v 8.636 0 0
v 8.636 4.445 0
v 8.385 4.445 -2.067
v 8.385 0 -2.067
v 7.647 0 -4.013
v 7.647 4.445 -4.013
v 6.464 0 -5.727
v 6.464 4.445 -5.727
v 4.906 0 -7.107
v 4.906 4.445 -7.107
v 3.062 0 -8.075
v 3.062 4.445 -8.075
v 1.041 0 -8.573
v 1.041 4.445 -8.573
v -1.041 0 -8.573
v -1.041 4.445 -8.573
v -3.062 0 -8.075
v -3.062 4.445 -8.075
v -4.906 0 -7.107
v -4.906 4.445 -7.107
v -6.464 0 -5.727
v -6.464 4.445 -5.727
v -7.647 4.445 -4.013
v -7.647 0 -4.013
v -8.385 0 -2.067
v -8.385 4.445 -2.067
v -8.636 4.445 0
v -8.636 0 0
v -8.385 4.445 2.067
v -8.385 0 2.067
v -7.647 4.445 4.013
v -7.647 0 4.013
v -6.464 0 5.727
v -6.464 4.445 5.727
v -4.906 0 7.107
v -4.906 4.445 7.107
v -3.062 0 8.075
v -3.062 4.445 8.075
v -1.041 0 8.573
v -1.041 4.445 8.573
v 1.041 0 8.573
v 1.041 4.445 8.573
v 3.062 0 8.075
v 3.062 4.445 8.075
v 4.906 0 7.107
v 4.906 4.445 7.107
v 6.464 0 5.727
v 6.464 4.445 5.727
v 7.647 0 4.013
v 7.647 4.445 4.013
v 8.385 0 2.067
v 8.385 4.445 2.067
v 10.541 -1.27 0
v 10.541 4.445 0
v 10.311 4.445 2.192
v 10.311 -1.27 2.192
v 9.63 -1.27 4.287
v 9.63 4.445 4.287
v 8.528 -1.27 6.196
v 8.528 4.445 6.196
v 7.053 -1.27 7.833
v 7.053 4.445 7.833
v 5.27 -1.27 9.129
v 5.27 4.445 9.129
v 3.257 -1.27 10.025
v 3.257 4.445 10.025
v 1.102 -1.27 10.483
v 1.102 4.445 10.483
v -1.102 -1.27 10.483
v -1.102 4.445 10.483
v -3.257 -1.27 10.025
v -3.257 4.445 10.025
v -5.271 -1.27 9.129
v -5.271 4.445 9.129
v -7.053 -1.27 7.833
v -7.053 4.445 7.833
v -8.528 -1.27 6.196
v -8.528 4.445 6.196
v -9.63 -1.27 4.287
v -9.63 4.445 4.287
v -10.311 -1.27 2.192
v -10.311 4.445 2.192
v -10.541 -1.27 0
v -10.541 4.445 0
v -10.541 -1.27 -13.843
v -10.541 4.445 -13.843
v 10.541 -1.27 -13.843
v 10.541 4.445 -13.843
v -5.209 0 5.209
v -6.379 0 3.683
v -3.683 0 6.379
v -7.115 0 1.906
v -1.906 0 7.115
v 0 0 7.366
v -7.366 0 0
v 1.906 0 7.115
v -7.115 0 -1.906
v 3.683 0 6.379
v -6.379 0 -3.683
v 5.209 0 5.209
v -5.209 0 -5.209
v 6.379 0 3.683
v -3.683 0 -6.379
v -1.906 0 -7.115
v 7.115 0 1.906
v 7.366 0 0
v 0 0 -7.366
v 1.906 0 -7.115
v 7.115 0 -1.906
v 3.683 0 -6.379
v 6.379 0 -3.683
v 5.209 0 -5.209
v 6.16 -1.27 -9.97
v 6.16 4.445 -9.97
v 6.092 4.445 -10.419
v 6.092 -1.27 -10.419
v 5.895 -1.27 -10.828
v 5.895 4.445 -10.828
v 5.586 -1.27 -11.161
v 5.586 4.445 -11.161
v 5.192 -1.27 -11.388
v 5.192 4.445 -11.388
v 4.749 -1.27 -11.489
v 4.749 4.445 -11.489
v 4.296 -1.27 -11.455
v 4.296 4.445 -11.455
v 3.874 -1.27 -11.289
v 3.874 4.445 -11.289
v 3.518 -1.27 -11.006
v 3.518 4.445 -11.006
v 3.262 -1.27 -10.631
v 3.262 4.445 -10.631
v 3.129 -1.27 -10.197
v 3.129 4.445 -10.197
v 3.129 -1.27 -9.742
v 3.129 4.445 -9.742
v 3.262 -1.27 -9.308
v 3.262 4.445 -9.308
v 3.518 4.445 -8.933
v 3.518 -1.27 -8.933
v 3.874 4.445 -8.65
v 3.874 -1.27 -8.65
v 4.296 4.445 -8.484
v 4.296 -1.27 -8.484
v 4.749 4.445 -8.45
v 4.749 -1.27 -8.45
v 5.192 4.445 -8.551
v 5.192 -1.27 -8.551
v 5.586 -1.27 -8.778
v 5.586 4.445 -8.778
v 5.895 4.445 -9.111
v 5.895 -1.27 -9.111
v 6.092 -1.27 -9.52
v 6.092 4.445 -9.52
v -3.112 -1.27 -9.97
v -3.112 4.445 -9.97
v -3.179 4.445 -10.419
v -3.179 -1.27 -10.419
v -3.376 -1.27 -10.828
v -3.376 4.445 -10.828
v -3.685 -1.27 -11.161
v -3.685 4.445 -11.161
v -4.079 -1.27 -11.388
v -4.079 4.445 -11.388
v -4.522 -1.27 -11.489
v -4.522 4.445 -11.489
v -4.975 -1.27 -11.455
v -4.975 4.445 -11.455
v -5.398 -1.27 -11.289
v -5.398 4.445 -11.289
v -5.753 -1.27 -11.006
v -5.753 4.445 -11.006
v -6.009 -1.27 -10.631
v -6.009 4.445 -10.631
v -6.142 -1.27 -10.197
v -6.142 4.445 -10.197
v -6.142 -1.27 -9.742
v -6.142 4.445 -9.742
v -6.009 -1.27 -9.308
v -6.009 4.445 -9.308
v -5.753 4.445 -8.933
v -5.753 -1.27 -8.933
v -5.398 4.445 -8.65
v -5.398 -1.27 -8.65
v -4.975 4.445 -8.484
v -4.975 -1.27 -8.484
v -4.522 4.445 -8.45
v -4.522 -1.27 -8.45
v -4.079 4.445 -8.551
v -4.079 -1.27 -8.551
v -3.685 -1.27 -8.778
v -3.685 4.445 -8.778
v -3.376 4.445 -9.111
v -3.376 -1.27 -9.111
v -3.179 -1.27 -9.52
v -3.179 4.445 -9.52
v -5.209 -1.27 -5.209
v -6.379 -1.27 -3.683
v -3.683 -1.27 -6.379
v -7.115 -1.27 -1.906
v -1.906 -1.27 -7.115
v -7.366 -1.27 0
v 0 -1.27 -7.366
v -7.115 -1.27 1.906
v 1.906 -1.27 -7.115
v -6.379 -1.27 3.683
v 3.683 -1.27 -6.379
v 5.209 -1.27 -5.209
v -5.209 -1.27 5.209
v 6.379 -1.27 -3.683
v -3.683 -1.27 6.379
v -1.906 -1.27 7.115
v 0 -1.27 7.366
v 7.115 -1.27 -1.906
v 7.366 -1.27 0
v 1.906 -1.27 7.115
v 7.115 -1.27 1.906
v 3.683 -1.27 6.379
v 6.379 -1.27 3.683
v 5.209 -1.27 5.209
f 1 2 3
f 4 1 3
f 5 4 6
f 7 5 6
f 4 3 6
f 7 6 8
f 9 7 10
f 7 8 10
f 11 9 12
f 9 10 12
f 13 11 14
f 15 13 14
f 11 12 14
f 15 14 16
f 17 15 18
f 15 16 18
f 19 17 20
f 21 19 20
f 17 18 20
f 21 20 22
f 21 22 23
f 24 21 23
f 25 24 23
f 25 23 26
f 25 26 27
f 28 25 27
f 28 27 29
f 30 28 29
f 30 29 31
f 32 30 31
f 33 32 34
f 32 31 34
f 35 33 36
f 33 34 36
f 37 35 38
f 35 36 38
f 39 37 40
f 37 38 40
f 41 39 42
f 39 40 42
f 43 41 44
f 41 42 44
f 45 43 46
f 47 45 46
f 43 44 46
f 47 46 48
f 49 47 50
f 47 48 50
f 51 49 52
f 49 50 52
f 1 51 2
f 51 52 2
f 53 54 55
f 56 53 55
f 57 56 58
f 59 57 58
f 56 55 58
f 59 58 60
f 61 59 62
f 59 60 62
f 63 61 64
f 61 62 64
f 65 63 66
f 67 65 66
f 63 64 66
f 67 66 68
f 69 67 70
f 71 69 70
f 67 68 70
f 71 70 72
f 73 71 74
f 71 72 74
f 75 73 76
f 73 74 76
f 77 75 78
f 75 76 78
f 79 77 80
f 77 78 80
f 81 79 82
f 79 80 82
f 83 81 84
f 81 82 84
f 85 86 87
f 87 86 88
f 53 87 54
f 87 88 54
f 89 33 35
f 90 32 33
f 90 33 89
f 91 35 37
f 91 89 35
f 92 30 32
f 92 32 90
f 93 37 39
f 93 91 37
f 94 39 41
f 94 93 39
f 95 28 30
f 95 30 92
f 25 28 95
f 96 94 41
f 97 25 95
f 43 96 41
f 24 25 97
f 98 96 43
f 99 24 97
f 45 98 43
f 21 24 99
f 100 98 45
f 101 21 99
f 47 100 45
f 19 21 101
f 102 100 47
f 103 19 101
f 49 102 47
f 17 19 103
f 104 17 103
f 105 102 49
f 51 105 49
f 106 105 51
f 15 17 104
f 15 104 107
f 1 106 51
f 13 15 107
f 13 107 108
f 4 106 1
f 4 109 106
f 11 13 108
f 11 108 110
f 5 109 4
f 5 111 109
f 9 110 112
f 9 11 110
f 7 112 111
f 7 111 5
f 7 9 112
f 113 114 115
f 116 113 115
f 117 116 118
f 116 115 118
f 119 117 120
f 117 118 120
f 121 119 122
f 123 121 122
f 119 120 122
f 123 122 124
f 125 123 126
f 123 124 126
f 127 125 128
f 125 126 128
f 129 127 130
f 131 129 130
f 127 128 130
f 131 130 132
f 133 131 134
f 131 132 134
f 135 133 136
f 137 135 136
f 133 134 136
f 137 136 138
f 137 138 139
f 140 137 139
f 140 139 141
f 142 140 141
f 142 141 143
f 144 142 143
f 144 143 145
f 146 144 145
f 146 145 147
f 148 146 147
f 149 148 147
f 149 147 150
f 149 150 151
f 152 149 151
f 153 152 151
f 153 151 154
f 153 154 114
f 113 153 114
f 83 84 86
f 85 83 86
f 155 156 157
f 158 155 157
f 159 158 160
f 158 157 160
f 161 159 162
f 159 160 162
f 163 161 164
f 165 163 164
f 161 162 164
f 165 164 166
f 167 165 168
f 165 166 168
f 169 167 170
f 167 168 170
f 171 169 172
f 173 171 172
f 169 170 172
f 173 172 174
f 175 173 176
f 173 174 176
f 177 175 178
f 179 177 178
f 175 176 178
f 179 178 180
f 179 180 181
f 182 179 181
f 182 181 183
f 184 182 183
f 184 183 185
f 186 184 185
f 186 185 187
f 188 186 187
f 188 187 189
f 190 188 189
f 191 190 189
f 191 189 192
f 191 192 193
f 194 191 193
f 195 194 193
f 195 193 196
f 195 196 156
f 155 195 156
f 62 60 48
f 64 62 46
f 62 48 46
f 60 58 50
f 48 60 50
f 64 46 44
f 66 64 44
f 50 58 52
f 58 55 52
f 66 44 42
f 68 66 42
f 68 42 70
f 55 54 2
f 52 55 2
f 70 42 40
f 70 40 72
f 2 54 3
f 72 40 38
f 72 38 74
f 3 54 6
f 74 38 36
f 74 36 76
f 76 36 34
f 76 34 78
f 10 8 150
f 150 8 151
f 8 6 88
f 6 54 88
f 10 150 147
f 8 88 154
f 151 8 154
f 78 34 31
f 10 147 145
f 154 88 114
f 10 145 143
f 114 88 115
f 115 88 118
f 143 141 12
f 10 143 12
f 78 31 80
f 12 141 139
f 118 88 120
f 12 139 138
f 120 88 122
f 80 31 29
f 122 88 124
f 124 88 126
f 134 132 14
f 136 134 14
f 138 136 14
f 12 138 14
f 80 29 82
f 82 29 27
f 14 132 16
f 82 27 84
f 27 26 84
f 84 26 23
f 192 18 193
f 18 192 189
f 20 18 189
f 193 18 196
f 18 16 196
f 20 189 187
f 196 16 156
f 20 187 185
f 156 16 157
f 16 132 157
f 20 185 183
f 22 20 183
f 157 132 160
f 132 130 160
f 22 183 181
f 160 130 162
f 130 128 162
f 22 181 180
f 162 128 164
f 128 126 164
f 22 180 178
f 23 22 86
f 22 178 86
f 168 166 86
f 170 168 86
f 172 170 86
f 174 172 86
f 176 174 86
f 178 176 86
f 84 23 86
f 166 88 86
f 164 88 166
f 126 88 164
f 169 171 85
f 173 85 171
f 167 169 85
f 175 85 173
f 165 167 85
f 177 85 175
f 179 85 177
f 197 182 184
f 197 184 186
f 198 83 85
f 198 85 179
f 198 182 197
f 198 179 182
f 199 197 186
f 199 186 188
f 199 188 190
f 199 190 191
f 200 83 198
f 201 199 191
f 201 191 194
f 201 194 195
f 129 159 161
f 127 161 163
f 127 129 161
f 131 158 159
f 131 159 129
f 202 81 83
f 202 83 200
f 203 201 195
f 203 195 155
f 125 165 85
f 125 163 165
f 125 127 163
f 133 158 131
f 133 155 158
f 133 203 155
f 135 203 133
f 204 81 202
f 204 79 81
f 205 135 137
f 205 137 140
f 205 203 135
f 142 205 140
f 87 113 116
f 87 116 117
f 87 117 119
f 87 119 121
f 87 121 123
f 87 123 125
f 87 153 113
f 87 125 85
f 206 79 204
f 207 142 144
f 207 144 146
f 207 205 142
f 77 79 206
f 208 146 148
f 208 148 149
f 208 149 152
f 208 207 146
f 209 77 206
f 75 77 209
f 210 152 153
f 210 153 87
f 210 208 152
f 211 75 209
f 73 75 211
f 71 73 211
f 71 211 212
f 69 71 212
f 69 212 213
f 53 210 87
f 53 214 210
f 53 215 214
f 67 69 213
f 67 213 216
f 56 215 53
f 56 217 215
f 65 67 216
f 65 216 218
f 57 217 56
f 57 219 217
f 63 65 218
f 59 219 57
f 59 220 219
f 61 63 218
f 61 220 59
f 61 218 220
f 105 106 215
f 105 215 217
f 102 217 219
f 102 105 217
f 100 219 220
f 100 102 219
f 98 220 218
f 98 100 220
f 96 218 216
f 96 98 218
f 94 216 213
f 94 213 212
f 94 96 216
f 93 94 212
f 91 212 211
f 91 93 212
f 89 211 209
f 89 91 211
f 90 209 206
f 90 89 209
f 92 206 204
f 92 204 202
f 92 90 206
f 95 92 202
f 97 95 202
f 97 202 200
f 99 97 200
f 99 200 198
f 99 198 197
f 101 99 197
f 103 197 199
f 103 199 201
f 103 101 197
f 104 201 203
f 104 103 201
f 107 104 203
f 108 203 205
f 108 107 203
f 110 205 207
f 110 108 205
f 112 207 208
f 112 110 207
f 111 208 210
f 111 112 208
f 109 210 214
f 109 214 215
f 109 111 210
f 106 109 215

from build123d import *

# Parameters (mm, degrees)
SKETCH1_R           = 6.096
BOSS_EXTRUDE1_DEPTH = 4.445
SKETCH5_R           = 7.366
BOSS_EXTRUDE4_DEPTH = 1.27
SKETCH8_R           = 8.636
CUT_EXTRUDE4_DEPTH  = 4.445
SKETCH6_R           = 1.524
CUT_EXTRUDE2_DEPTH  = 6.715
SKETCH7_W           = 9.525
SKETCH7_H           = 4.445
CUT_EXTRUDE3_DEPTH  = 3.175


with BuildPart() as part:
    # Sketch1 → Boss-Extrude1 (new body)
    with BuildSketch(Plane(origin=(0, 0, 0), x_dir=(1, 0, 0), z_dir=(0, 1, 0))):
        with BuildLine():
            Line((-10.541, 0), (-10.541, 10.668))
            Line((-10.541, 10.668), (-20.066, 10.668))
            Line((-20.066, 10.668), (-20.066, 13.843))
            Line((-20.066, 13.843), (-7.366, 13.843))
            Line((-7.366, 13.843), (7.366, 13.843))
            Line((7.366, 13.843), (20.066, 13.843))
            Line((20.066, 13.843), (20.066, 10.668))
            Line((20.066, 10.668), (10.541, 10.668))
            Line((10.541, 10.668), (10.541, 0))
            ThreePointArc((10.541, 0), (0, -10.541), (-10.541, 0))
        make_face()
        Circle(SKETCH1_R, mode=Mode.SUBTRACT)
    extrude(amount=BOSS_EXTRUDE1_DEPTH)

    # Sketch5 → Boss-Extrude4 (add)
    with BuildSketch(Plane.XZ):
        with BuildLine():
            Line((-10.541, 0), (-10.541, -10.668))
            Line((-10.541, -10.668), (-10.541, -13.843))
            Line((-10.541, -13.843), (10.541, -13.843))
            Line((10.541, -13.843), (10.541, -10.668))
            Line((10.541, -10.668), (10.541, 0))
            ThreePointArc((10.541, 0), (0, 10.541), (-10.541, 0))
        make_face()
        Circle(SKETCH5_R, mode=Mode.SUBTRACT)
    extrude(amount=BOSS_EXTRUDE4_DEPTH)

    # Sketch8 → Cut-Extrude4 (cut)
    with BuildSketch(Plane(origin=(0, 4.445, 0), x_dir=(1, 0, 0), z_dir=(0, 1, 0))):
        Circle(SKETCH8_R)
    extrude(amount=-CUT_EXTRUDE4_DEPTH, mode=Mode.SUBTRACT)

    # Sketch6 → Cut-Extrude2 (cut, through all)
    with BuildSketch(Plane(origin=(0, 4.445, 0), x_dir=(1, 0, 0), z_dir=(0, 1, 0))):
        with Locations((4.6355, 9.9695)):
            Circle(SKETCH6_R)
        with Locations((-4.6355, 9.9695)):
            Circle(SKETCH6_R)
    extrude(amount=-CUT_EXTRUDE2_DEPTH, mode=Mode.SUBTRACT)

    # Sketch7 → Cut-Extrude3 (cut)
    with BuildSketch(Plane.XY.offset(-10.668)):
        with Locations((15.3035, 2.2225)):
            Rectangle(SKETCH7_W, SKETCH7_H)
        with Locations((-15.3035, 2.2225)):
            Rectangle(SKETCH7_W, SKETCH7_H)
    extrude(amount=-CUT_EXTRUDE3_DEPTH, mode=Mode.SUBTRACT)


solid = part.part
